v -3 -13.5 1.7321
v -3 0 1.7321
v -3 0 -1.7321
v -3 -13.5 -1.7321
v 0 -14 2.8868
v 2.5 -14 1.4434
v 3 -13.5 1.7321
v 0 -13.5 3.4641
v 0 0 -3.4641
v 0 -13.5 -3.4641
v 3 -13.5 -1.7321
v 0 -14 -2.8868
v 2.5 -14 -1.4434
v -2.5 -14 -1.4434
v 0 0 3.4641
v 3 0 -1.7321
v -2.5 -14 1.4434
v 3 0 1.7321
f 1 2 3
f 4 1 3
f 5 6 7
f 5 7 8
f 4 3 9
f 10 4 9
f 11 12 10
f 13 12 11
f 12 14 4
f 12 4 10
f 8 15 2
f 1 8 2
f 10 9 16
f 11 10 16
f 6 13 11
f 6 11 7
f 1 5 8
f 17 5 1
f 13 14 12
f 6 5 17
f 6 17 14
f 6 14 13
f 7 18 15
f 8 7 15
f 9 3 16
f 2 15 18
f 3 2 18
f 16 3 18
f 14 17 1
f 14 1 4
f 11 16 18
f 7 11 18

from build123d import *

# Parameters (mm, degrees)
F1_DEPTH = 14
F2_SIZE  = 0.5


with BuildPart() as f1:
    # F0 (on Front) → F1 (new body)
    with BuildSketch(Plane.XZ):
        Polygon((3, -1.732051), (3, 1.732051), (0, 3.464102), (-3, 1.732051), (-3, -1.732051), (0, -3.464102), align=None)
    extrude(amount=F1_DEPTH)

    # F2
    f2_edges = [f1.edges().sort_by_distance(p)[0] for p in [
        (-1.5, -14, 2.598076),
        (-3, -14, 0),
        (-1.5, -14, -2.598076),
        (1.5, -14, -2.598076),
        (3, -14, 0),
        (1.5, -14, 2.598076),
    ]]
    chamfer(f2_edges, length=F2_SIZE)


solid = f1.part
